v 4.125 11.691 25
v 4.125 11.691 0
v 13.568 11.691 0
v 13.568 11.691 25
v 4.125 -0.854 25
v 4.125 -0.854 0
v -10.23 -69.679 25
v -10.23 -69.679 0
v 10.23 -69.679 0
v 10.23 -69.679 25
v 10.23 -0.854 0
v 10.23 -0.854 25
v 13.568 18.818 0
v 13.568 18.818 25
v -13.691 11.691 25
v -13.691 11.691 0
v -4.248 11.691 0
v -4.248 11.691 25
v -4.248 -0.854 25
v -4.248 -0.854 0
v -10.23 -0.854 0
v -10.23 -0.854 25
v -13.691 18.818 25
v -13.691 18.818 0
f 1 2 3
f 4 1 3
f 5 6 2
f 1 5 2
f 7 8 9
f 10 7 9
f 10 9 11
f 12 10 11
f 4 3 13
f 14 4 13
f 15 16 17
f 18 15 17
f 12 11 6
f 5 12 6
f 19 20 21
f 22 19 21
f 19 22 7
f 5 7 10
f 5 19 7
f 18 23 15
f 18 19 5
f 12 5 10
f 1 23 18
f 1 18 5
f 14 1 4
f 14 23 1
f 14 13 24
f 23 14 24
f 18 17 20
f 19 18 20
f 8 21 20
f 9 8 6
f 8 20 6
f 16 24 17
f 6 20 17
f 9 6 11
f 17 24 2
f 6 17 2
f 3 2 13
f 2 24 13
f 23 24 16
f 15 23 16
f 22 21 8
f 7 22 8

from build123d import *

# Parameters (mm, degrees)
F1_DEPTH = 25


with BuildPart() as f1:
    # F0 (on Top) → F1 (new body)
    with BuildSketch(Plane.XY):
        Polygon((10.229582, -0.854153), (4.12538, -0.854153), (-4.248491, -0.854153), (-10.229582, -0.854153), (-10.229582, -69.679364), (10.229582, -69.679364), align=None)
        Polygon((13.568254, 11.691391), (13.568254, 18.818088), (-13.691364, 18.818088), (-13.691364, 11.691391), (-4.248491, 11.691391), (-4.248491, -0.854153), (4.12538, -0.854153), (4.12538, 11.691391), align=None)
    extrude(amount=F1_DEPTH)


solid = f1.part
